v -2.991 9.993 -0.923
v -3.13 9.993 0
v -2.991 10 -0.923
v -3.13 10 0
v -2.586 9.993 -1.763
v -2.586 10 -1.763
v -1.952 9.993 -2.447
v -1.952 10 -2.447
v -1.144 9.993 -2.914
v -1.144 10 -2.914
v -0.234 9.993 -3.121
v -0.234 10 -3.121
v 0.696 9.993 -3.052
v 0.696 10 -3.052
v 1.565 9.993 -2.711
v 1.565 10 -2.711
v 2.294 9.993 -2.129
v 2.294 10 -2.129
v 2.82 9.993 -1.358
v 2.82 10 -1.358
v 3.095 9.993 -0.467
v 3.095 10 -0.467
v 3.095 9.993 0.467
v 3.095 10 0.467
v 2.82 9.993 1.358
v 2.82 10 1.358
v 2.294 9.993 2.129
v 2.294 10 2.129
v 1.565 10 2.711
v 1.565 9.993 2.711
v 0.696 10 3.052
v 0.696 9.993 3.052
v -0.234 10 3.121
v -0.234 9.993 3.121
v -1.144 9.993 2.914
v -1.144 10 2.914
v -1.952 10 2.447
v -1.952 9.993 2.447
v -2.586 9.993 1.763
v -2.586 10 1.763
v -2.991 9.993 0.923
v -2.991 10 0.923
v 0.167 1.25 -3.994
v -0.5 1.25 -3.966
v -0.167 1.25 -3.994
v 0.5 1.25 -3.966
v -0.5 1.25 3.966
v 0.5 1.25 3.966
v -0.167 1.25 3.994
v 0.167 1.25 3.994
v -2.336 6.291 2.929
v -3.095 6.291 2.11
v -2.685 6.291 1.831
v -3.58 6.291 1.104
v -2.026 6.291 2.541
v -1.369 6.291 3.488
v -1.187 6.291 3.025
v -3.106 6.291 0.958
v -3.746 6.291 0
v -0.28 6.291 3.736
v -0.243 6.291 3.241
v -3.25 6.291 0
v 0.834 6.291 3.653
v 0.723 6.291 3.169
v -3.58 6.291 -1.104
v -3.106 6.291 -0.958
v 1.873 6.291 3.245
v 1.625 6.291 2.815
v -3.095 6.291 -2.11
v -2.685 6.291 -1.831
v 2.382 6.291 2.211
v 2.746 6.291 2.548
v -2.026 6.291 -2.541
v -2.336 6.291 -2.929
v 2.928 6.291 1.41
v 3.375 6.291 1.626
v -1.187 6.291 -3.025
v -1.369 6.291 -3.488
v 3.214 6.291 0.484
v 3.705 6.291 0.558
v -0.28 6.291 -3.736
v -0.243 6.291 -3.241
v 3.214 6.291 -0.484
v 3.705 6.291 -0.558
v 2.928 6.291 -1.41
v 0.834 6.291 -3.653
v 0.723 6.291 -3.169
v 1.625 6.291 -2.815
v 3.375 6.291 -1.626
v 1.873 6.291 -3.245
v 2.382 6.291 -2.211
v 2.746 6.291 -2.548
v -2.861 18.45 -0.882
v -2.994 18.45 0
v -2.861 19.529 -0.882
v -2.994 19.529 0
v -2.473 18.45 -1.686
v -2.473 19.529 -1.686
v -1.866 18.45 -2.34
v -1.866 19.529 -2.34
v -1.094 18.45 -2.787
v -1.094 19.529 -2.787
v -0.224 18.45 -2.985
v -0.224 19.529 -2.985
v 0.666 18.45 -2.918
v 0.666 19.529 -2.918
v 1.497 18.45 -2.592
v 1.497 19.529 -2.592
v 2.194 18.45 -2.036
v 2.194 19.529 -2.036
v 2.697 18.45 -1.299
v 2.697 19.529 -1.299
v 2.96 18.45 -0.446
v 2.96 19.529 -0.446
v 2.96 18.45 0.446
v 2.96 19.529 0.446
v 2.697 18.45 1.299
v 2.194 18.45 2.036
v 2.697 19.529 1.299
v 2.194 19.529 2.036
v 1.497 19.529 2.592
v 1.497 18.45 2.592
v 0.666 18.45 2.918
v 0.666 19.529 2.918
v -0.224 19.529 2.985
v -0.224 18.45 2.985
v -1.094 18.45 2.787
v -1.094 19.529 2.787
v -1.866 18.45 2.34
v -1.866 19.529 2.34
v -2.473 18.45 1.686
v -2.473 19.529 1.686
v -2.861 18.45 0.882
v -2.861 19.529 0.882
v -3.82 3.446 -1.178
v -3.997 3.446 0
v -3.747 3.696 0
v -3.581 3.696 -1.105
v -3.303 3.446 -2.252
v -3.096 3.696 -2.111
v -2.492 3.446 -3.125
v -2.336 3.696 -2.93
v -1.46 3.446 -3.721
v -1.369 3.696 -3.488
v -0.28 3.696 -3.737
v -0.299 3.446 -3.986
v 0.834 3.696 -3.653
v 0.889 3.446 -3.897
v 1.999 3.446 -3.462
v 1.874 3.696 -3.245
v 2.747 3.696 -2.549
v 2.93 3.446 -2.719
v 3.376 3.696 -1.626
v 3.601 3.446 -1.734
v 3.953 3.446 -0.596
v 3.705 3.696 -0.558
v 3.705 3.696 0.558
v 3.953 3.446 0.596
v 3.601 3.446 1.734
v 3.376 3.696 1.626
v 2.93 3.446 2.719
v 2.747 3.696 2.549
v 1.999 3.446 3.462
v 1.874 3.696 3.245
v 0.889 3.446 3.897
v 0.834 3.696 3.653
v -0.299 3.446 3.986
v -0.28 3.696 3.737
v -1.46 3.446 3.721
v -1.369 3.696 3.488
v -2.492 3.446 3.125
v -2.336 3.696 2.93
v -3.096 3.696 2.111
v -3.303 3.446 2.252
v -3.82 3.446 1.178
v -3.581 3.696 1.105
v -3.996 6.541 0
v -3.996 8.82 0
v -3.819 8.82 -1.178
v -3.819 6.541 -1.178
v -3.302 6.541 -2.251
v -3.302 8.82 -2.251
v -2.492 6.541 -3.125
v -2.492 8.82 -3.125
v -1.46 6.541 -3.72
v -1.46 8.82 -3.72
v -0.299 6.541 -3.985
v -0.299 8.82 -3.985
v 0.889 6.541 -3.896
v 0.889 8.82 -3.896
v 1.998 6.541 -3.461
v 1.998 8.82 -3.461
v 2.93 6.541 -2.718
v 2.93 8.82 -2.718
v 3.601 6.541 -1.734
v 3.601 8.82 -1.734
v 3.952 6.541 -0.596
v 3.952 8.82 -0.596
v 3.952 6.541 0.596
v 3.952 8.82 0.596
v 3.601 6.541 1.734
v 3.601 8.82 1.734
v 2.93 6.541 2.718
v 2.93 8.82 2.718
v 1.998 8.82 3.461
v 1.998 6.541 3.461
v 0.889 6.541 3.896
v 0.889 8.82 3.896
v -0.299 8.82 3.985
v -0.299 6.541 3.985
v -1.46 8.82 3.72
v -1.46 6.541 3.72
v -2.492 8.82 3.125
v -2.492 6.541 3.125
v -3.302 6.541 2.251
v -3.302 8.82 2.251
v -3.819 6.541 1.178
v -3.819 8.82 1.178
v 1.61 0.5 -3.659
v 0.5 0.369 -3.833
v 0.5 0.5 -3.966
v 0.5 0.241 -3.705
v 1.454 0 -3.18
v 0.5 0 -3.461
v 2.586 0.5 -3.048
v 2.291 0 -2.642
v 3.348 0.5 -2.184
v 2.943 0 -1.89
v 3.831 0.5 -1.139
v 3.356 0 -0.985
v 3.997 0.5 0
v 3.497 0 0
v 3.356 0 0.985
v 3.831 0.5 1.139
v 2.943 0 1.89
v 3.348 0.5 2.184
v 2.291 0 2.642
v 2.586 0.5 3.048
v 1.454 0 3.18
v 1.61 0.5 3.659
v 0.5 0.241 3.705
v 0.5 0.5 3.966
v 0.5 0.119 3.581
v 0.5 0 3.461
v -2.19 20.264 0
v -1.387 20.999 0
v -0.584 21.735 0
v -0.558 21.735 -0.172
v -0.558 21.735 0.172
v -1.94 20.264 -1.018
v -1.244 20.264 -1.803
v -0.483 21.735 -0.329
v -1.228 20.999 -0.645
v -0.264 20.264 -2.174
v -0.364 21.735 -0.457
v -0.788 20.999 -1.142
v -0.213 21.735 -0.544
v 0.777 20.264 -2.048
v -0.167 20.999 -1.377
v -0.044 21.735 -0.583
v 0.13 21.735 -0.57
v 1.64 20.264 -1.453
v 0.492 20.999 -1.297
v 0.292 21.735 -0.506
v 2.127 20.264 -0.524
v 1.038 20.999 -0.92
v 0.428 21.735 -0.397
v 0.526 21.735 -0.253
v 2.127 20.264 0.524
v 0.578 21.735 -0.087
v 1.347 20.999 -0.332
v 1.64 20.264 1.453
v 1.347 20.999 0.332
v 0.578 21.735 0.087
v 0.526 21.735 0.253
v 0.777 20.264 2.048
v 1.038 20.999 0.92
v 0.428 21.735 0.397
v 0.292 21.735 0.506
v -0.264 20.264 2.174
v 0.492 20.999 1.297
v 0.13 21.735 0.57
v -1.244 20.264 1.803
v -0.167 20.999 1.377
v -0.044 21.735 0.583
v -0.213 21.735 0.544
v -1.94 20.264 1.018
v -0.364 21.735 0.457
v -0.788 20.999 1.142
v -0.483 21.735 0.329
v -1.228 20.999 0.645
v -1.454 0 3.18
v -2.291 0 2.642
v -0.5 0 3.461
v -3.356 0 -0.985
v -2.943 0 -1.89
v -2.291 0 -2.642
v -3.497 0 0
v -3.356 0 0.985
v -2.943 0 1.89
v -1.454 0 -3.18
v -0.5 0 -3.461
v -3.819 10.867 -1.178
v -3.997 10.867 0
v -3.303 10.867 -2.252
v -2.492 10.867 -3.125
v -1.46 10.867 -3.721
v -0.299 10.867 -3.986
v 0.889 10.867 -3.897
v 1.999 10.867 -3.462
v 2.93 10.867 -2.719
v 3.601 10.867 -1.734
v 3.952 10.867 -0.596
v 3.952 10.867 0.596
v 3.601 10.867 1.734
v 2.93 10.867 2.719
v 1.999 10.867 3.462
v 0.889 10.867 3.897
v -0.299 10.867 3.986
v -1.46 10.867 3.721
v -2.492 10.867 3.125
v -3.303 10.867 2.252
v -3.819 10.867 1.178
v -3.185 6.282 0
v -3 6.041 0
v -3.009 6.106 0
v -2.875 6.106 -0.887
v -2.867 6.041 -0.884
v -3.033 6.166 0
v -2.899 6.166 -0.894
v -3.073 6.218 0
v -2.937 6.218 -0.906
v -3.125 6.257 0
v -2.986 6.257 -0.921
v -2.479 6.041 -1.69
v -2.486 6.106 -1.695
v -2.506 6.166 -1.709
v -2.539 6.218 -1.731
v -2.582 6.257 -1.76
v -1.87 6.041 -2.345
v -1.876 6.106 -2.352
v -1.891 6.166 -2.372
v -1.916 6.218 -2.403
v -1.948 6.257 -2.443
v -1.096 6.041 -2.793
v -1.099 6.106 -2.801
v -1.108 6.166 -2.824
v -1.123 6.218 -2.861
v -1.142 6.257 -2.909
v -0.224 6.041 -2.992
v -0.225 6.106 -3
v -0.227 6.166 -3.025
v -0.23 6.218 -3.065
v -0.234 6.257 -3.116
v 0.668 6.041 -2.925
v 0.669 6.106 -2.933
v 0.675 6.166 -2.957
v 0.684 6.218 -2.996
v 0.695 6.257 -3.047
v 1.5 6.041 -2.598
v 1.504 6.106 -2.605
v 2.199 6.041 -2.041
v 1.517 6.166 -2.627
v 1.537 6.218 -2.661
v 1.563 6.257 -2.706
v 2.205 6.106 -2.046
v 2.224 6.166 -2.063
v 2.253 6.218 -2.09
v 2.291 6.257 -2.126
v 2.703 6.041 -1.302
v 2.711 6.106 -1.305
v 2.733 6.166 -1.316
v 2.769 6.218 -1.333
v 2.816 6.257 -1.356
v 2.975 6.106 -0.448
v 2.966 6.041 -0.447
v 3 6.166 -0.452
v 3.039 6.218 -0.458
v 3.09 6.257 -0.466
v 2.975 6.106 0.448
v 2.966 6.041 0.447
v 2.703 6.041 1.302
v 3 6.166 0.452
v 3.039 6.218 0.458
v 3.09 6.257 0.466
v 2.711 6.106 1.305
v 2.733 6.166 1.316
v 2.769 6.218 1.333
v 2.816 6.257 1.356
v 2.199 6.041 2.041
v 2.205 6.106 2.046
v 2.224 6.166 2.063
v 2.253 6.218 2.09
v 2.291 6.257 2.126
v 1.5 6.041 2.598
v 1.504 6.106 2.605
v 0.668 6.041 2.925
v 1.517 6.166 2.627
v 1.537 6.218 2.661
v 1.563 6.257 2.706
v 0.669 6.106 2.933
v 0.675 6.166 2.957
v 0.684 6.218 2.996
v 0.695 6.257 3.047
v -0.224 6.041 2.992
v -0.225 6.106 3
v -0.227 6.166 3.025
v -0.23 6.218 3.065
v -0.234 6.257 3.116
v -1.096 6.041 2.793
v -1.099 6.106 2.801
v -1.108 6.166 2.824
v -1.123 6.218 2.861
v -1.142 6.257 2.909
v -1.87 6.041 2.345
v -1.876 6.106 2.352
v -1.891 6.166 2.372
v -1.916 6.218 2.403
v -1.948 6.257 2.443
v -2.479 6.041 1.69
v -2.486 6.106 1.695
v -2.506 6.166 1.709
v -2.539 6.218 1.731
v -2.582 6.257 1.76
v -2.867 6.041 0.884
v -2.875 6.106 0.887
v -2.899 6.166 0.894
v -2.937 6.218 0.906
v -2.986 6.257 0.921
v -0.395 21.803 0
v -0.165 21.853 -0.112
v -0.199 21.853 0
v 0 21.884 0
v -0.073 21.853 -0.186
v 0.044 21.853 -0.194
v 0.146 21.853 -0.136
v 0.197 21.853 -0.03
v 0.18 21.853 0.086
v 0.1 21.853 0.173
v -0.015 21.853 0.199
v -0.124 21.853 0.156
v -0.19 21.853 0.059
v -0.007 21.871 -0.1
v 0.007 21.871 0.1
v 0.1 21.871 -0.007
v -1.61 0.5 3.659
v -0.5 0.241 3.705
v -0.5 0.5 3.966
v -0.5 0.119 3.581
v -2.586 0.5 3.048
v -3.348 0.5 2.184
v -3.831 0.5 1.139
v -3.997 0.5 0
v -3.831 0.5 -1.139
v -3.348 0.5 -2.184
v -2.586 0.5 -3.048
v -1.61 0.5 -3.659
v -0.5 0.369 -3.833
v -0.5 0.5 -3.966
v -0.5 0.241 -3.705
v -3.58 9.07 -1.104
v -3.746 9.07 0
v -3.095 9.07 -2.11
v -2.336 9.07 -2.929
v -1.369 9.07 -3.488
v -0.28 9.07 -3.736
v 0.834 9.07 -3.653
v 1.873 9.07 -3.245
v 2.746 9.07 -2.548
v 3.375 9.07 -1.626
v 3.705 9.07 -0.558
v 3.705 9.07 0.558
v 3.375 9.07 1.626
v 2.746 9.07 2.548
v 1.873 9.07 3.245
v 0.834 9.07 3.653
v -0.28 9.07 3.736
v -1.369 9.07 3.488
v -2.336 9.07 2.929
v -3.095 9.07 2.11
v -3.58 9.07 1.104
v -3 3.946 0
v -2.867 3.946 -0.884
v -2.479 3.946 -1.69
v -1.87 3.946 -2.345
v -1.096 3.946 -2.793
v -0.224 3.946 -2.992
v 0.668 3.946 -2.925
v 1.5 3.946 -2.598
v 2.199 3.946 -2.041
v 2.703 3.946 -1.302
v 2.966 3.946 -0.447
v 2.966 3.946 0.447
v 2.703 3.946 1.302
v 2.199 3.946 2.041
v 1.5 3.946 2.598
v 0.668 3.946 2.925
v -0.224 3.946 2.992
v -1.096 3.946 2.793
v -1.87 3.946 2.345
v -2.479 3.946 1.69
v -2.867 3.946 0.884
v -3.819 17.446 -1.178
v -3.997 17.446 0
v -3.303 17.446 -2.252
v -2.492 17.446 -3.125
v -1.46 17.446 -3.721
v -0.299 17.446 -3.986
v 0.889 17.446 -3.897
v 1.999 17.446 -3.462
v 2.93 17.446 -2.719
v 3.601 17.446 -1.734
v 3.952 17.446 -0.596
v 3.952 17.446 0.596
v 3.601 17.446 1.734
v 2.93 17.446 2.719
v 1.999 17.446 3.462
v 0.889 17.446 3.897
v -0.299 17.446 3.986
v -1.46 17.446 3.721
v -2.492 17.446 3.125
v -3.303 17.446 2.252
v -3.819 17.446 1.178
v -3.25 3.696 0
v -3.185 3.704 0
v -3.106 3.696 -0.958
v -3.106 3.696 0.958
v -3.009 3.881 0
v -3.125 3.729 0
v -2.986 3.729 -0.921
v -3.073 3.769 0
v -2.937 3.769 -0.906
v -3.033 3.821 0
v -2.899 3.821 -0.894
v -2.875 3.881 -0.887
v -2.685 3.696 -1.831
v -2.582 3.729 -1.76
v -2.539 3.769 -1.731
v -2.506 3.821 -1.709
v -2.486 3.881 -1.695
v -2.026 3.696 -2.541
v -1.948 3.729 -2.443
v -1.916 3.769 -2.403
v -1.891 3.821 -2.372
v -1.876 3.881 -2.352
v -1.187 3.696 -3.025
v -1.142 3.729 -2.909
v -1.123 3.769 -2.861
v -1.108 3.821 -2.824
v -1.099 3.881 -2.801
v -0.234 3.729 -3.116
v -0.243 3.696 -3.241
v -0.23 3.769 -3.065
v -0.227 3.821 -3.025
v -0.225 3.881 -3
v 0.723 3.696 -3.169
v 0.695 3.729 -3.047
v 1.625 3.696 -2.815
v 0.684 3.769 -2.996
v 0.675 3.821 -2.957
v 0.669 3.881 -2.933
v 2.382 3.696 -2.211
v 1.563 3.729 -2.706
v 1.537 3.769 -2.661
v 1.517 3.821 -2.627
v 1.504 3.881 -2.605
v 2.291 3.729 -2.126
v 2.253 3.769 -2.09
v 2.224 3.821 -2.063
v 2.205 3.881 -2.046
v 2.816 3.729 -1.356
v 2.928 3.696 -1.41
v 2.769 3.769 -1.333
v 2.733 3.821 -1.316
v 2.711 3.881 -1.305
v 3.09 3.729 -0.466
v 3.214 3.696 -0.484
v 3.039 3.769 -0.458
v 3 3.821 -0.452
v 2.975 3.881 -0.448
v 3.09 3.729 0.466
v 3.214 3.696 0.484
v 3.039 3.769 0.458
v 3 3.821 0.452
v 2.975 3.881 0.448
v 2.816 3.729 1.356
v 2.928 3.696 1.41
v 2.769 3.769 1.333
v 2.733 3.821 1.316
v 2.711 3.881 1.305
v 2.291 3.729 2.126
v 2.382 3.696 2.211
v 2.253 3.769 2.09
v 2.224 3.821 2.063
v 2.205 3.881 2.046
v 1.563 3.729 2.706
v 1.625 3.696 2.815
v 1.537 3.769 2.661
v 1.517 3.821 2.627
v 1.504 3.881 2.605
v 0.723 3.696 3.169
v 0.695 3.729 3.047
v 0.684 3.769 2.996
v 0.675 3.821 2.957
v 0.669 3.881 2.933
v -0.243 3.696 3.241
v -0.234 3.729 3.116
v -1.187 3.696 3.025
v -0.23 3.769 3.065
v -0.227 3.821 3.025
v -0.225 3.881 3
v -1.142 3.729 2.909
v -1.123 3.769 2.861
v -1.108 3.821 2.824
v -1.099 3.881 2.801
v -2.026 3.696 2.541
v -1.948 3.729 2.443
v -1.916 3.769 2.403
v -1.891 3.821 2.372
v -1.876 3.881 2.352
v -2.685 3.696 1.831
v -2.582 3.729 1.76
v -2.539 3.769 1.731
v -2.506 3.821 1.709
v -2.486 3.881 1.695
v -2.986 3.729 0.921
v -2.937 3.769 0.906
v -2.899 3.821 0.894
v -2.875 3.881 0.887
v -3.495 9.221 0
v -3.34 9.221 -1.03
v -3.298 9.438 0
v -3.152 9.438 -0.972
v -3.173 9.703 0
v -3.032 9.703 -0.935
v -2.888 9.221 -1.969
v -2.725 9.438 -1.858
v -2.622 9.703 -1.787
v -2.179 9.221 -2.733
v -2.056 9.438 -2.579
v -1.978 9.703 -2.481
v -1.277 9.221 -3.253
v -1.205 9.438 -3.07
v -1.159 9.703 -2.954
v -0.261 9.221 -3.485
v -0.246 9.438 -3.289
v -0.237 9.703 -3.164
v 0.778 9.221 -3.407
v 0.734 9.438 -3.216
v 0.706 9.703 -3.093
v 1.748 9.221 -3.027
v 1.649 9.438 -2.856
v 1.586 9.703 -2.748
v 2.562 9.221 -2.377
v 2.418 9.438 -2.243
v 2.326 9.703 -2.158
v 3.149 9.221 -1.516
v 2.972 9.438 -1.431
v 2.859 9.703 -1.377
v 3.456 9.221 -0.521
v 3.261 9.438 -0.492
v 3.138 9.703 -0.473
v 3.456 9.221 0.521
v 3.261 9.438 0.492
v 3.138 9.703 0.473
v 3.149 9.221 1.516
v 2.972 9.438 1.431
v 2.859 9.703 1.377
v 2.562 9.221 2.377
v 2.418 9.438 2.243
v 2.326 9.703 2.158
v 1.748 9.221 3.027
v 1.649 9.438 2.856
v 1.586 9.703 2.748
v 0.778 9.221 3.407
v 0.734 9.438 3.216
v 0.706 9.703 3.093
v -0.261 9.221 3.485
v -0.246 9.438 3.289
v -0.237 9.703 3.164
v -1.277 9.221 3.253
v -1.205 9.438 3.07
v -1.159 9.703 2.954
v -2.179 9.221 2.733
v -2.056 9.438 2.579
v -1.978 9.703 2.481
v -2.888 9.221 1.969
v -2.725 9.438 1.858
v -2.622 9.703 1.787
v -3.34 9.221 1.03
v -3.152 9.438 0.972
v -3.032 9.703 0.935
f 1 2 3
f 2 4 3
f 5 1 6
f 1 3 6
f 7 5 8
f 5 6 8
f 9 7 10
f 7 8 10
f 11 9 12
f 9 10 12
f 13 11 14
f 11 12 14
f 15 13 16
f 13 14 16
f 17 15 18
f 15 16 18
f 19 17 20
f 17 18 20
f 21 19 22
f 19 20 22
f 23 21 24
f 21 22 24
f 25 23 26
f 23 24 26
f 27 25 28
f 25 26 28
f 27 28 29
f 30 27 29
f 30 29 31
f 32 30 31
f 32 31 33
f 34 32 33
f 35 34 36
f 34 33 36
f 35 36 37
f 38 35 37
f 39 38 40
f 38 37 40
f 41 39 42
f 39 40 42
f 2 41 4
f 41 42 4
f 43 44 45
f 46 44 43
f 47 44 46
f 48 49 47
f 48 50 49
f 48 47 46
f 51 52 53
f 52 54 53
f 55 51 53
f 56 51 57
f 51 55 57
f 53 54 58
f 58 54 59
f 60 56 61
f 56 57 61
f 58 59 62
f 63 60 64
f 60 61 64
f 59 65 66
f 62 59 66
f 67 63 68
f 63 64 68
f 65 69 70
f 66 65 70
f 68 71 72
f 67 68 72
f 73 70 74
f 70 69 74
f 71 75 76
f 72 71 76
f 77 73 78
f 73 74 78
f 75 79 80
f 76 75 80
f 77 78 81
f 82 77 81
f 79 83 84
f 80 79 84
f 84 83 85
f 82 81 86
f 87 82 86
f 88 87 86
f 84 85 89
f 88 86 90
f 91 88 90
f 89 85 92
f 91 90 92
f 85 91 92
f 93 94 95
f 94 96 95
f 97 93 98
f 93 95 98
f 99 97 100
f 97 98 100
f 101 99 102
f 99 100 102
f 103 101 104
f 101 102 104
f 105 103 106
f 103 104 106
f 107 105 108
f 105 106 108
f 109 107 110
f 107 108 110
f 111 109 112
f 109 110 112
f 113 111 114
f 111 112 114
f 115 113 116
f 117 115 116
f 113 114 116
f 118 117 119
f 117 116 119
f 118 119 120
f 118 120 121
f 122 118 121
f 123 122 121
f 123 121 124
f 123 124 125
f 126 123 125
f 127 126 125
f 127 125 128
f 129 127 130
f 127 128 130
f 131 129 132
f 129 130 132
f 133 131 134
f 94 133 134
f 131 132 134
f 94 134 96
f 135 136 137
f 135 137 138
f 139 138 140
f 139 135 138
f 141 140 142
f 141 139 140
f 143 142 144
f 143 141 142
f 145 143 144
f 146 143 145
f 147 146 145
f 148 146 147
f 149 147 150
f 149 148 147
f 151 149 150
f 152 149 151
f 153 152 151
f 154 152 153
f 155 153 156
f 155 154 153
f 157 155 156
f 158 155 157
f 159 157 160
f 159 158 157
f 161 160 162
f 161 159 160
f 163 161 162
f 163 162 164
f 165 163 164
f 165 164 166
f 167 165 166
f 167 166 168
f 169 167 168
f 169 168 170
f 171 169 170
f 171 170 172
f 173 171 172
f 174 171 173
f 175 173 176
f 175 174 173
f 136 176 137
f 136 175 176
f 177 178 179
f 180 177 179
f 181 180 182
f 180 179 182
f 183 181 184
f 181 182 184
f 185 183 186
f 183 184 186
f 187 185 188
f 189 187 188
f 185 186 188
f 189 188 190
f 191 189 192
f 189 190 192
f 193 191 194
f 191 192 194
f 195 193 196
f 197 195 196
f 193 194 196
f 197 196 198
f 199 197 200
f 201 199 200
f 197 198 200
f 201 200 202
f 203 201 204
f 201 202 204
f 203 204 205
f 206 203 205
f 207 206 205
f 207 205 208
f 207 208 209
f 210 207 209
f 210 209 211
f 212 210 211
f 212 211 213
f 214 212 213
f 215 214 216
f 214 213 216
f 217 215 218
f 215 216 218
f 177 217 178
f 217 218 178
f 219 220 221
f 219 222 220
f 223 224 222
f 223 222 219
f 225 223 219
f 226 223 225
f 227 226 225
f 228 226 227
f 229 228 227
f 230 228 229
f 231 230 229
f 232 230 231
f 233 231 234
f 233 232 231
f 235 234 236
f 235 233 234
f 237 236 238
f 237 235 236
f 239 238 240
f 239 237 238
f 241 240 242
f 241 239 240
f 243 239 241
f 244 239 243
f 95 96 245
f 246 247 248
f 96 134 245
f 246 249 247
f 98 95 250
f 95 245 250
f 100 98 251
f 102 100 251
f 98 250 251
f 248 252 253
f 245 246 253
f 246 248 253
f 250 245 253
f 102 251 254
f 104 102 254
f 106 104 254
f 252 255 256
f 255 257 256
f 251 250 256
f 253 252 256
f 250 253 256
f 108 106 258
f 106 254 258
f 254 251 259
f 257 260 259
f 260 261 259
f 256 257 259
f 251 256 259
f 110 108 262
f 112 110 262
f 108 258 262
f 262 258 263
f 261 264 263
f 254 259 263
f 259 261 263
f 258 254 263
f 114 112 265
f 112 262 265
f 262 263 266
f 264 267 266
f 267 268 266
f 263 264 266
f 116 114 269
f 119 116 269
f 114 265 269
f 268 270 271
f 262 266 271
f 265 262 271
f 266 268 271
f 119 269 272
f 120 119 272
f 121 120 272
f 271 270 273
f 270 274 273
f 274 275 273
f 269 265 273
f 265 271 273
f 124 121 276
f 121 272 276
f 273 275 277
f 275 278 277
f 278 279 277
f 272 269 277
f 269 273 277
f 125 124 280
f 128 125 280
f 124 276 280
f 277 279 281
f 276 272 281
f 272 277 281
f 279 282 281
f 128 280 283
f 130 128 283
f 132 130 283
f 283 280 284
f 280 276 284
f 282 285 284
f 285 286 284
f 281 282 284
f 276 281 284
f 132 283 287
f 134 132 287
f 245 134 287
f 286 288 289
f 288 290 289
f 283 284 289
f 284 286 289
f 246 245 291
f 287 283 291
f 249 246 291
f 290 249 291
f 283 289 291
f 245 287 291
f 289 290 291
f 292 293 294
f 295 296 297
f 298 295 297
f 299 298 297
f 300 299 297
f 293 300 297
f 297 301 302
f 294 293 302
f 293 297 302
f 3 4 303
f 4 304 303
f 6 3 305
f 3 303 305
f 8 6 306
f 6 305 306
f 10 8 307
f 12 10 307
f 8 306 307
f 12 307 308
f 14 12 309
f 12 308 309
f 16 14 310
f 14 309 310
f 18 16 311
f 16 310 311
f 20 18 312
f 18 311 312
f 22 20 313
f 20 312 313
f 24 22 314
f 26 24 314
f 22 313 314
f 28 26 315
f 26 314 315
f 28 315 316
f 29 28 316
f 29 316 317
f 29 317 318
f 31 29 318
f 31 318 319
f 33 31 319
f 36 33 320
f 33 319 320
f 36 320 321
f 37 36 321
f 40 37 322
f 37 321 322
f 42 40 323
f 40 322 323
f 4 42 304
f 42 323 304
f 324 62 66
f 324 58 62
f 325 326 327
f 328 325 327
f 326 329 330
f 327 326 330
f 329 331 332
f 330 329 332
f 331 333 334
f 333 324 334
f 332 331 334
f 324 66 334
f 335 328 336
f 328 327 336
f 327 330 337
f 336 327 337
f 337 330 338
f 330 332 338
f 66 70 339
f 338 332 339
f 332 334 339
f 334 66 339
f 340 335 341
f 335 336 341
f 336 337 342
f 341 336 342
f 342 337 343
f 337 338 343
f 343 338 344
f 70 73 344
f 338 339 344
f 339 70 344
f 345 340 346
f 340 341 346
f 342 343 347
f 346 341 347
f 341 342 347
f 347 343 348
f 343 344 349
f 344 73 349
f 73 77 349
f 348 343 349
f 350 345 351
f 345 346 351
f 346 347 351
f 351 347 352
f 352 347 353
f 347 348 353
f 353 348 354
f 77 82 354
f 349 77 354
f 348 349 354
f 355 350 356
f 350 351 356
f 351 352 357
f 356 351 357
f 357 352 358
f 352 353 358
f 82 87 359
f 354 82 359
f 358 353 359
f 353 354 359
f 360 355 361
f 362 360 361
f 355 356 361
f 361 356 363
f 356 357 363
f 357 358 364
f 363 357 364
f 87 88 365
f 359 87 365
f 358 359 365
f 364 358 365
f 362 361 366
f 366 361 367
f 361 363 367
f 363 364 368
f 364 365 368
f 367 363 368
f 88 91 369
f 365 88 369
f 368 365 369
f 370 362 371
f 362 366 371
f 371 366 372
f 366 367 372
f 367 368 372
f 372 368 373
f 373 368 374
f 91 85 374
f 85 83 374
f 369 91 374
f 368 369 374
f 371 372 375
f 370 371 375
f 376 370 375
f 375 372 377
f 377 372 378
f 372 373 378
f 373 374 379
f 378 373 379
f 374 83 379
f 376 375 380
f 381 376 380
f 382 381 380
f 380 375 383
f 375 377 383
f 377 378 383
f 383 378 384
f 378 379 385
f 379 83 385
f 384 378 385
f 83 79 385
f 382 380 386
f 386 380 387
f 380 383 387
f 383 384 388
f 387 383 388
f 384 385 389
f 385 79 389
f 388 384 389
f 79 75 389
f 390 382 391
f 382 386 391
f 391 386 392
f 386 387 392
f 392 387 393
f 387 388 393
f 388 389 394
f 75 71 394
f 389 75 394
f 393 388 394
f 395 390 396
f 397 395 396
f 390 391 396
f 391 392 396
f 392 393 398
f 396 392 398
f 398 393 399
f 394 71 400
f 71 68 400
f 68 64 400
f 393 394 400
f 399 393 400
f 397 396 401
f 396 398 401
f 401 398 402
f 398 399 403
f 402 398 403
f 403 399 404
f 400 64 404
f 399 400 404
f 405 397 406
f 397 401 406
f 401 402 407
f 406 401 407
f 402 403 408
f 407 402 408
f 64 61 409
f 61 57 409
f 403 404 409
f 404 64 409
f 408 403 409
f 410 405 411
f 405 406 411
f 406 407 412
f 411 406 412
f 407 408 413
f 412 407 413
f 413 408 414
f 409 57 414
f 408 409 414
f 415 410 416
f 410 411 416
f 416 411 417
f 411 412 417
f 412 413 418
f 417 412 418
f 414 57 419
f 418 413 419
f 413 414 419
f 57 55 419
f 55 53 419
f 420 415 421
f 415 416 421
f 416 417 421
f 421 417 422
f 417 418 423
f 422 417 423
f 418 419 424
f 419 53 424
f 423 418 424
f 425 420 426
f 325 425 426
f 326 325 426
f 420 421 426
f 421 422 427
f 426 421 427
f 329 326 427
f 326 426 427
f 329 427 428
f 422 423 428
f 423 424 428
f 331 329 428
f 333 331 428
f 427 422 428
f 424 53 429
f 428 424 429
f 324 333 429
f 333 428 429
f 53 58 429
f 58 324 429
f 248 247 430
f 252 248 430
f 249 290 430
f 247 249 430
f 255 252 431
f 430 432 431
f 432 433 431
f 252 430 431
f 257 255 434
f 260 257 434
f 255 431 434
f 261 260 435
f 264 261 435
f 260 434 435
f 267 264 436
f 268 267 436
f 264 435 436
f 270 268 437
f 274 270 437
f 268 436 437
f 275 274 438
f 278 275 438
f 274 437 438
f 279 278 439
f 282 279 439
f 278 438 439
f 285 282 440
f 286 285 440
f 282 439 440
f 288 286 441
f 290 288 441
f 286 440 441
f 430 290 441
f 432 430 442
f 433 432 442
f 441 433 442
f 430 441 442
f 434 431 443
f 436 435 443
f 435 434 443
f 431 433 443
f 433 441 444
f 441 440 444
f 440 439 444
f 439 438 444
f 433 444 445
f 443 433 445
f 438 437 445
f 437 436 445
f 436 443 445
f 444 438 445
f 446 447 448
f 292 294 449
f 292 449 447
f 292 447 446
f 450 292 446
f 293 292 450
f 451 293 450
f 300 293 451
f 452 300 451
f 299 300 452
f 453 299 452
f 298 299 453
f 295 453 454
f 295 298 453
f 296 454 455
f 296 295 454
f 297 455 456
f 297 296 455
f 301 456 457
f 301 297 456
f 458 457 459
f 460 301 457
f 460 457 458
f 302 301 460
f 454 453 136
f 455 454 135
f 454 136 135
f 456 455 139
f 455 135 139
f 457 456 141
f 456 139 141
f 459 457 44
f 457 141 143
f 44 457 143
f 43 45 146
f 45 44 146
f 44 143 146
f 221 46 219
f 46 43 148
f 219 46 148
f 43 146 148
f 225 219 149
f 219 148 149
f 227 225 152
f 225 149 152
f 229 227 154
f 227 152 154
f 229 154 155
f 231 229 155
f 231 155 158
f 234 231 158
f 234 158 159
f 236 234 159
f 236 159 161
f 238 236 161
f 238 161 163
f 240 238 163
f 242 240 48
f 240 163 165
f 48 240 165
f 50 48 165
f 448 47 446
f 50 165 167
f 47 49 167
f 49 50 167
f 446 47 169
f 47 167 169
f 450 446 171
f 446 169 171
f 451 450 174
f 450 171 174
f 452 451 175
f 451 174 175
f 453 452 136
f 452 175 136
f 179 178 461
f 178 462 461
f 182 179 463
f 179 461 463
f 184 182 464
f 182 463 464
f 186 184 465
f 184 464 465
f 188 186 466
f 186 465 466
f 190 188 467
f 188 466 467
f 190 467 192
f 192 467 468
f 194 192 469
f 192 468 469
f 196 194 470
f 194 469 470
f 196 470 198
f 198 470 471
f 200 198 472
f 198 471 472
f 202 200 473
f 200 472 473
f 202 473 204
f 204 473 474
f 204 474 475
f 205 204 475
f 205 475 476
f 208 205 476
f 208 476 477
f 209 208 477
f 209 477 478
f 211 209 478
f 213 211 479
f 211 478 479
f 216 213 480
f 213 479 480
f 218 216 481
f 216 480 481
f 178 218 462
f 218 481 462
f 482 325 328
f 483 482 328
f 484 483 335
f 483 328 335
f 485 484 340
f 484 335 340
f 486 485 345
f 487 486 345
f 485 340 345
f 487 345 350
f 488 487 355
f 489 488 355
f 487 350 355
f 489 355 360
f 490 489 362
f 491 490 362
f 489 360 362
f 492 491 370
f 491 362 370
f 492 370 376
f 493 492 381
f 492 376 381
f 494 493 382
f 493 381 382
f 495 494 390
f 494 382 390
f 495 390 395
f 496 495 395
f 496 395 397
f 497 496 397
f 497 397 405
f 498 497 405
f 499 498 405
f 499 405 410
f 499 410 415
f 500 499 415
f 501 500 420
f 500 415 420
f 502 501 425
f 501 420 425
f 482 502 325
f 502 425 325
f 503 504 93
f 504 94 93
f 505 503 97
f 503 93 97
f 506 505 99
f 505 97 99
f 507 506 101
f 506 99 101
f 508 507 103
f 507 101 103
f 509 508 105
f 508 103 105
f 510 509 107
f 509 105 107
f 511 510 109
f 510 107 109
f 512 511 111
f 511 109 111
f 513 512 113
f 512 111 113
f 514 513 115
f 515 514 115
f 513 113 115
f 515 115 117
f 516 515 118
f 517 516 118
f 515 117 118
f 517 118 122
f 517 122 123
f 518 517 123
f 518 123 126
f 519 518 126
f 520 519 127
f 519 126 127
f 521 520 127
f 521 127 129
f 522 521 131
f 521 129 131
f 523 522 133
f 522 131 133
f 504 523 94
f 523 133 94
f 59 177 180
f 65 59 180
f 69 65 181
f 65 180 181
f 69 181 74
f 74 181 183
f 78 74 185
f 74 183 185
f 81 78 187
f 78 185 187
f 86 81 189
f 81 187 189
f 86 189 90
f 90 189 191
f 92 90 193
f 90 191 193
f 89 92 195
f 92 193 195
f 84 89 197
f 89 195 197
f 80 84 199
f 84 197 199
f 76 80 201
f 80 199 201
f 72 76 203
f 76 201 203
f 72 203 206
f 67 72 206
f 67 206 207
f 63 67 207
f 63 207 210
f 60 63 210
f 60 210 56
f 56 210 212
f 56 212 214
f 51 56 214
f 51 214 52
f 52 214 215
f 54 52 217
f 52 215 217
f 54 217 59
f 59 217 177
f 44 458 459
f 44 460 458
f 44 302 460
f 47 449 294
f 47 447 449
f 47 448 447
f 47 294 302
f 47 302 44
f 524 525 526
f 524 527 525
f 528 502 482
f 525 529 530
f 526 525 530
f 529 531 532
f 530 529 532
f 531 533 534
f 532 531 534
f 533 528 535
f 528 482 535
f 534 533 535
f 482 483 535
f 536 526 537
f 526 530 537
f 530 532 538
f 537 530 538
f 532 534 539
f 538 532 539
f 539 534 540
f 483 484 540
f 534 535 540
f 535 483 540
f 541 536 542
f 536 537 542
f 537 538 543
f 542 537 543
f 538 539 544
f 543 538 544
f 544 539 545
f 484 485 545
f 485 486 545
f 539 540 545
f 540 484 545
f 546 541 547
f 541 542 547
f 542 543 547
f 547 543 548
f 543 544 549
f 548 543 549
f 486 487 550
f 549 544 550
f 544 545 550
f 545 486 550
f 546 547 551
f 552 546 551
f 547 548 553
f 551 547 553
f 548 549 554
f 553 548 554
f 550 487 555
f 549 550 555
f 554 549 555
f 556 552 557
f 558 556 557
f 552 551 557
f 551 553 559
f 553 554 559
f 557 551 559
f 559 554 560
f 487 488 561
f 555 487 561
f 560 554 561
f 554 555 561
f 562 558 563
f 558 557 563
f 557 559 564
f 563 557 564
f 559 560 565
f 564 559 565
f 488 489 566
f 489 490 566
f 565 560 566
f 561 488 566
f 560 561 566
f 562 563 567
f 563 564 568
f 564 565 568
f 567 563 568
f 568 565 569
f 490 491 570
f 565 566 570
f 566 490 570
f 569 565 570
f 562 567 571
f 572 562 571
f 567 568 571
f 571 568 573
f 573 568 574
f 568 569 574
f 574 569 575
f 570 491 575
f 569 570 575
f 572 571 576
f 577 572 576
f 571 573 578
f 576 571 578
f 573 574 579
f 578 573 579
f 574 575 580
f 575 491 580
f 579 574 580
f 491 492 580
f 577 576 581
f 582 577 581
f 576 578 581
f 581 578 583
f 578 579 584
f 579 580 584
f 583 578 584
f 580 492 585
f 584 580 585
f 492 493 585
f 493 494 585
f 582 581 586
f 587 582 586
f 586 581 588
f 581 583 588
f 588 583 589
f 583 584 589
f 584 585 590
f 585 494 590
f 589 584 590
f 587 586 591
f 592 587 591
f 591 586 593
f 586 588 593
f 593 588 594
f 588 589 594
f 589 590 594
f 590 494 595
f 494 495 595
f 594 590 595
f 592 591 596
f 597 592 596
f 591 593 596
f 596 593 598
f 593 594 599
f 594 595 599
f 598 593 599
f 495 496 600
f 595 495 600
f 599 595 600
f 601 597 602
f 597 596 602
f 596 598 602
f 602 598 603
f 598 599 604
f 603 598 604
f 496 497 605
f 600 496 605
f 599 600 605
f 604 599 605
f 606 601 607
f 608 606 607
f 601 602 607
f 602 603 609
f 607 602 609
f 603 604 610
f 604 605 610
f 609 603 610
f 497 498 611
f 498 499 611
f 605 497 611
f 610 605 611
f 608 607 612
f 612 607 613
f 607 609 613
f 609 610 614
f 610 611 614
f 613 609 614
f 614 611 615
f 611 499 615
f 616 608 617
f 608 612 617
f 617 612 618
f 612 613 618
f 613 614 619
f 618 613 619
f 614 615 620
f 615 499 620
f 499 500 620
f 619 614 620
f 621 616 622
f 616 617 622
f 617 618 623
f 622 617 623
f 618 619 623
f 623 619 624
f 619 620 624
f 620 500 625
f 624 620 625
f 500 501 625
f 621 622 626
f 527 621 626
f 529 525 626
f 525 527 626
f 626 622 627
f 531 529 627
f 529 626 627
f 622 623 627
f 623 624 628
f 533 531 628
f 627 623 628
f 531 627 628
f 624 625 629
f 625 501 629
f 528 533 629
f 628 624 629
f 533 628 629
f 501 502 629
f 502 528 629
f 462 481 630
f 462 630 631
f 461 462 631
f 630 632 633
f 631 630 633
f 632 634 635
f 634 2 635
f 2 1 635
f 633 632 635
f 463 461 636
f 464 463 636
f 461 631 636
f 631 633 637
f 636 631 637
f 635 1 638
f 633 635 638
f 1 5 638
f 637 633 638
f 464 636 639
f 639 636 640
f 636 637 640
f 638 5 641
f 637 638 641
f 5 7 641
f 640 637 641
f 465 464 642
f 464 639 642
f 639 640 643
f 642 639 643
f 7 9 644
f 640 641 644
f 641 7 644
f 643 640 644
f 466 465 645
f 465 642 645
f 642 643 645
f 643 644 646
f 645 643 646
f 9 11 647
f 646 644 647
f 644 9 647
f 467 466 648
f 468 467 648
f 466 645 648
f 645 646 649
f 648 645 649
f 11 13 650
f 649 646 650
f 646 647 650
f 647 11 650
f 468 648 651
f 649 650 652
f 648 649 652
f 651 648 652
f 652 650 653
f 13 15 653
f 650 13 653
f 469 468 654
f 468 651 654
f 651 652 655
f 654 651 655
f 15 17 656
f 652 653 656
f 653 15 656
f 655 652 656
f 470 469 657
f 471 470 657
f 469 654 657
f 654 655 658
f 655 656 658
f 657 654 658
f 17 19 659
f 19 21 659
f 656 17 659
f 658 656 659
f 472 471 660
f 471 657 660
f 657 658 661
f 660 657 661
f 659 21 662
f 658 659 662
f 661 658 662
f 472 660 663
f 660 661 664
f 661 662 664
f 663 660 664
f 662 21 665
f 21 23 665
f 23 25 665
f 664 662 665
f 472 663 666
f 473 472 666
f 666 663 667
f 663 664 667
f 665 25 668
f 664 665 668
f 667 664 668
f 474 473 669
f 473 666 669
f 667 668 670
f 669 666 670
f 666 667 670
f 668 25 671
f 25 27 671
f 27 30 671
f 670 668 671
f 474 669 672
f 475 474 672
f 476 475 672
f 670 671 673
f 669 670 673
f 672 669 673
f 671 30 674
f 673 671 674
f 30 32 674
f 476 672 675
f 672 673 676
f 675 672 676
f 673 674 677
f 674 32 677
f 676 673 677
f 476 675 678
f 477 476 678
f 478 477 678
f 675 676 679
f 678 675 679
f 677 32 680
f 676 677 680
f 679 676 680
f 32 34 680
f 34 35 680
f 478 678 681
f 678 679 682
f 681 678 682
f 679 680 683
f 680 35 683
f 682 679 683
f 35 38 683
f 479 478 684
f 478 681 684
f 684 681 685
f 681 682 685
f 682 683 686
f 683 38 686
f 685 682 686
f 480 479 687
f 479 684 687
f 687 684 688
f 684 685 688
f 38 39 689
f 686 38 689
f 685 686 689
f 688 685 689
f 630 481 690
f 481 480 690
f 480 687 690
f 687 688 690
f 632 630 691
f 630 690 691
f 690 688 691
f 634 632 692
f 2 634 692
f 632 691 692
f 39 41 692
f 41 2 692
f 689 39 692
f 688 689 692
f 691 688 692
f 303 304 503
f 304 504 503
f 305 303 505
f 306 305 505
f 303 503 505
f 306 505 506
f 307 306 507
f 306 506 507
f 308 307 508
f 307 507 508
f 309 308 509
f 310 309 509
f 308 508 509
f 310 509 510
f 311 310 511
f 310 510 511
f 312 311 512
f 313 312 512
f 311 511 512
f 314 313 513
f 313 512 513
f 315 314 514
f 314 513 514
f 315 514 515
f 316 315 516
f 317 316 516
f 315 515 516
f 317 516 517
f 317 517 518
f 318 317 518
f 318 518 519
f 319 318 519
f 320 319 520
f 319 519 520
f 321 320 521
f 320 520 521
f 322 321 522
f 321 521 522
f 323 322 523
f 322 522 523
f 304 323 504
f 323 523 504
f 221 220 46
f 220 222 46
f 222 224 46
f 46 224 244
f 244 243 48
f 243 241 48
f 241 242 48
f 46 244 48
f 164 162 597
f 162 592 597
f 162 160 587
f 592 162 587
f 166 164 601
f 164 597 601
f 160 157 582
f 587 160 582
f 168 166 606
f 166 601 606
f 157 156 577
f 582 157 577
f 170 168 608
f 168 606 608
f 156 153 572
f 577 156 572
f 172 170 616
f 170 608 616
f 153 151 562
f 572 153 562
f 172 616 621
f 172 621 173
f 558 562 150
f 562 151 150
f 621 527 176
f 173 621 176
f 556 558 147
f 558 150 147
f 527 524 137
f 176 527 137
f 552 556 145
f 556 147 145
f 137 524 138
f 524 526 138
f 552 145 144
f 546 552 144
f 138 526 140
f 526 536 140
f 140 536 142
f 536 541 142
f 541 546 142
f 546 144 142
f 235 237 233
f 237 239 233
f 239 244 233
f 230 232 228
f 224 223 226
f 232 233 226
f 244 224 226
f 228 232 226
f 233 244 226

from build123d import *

# Parameters (mm, degrees)
REDONDEO1_R           = 0.25
CHAFL_N7_SIZE         = 0.25
CHAFL_N9_SIZE         = 0.5
CROQUIS1_W            = 1
CROQUIS1_H            = 1.25
CORTAR_EXTRUIR1_DEPTH = 40
REDONDEO2_R           = 1


with BuildPart() as part:
    # Sketch1 → Revolve1 (revolve)
    with BuildSketch(Plane.XY):
        with BuildLine():
            Line((0, 0), (-3.99720796, 0))
            Line((-3.99720796, 0), (-3.99720796, 3.695721343))
            Line((-3.99720796, 3.695721343), (-3, 3.695721343))
            Line((-3, 3.695721343), (-3, 6.290801943))
            Line((-3, 6.290801943), (-3.996490616, 6.290801943))
            Line((-3.996490616, 6.290801943), (-3.996490616, 9.069605063))
            Line((-3.996490616, 9.069605063), (-3.13, 9.069605063))
            Line((-3.13, 9.069605063), (-3.13, 10))
            Line((-3.13, 10), (-3.997062109, 10.867062109))
            Line((-3.997062109, 10.867062109), (-3.997062109, 17.446452736))
            Line((-3.997062109, 17.446452736), (-2.993514845, 18.45))
            Line((-2.993514845, 18.45), (-2.993514845, 19.528543236))
            Line((-2.993514845, 19.528543236), (-0.584226233, 21.734587674))
            ThreePointArc((-0.584226233, 21.734587674), (-0.297614848, 21.830829517), (0, 21.884064665))
            Line((0, 21.884064665), (0, 0))
        make_face()
    revolve(axis=Axis((0, 21.884064665, 0), (0, -1, 0)))

    # Redondeo1
    redondeo1_edges = [part.edges().sort_by_distance(p)[0] for p in [
        (3, 6.290801943, 0),
        (3, 3.695721343, 0),
    ]]
    fillet(redondeo1_edges, radius=REDONDEO1_R)

    # Chaflán7
    chafl_n7_edges = [part.edges().sort_by_distance(p)[0] for p in [
        (3.996490616, 9.069605063, 0),
        (3.996490616, 6.290801943, 0),
        (3.99720796, 3.695721343, 0),
    ]]
    chamfer(chafl_n7_edges, length=CHAFL_N7_SIZE)

    # Chaflán9
    chafl_n9_edges = [part.edges().sort_by_distance(p)[0] for p in [
        (3.99720796, 0, 0),
    ]]
    chamfer(chafl_n9_edges, length=CHAFL_N9_SIZE)

    # Croquis1 → Cortar-Extruir1 (cut)
    with BuildSketch(Plane.XY.offset(10)):
        with Locations((0, 0.625)):
            Rectangle(CROQUIS1_W, CROQUIS1_H)
    extrude(amount=-CORTAR_EXTRUIR1_DEPTH, mode=Mode.SUBTRACT)

    # Redondeo2
    # the kernel refuses this fillet: 1 mm, written as the material it adds along each edge
    with BuildSketch(Plane(origin=(0, 9.069605063, 0), x_dir=(-1, 0, 0), z_dir=(0, 0, 1))) as redondeo2_piece_1:
        with BuildLine():
            CenterArc((4.13, -0.923536979), REDONDEO2_R, 112.55123215, 67.44876785)
            Line((3.13, -0.923536979), (3.11, -0.923536979))
            Line((3.11, -0.923536979), (3.11, 0))
            Line((3.11, 0), (3.13, 0.02))
            ThreePointArc((3.13, 0.02), (3.438245308, 0.02), (3.738820428, 0.01847074))
            Line((3.738820428, 0.01847074), (3.746490616, 0))
        make_face()
    revolve(axis=Axis((0, 9.069605063, 0), (0, -1, 0)))


solid = part.part
